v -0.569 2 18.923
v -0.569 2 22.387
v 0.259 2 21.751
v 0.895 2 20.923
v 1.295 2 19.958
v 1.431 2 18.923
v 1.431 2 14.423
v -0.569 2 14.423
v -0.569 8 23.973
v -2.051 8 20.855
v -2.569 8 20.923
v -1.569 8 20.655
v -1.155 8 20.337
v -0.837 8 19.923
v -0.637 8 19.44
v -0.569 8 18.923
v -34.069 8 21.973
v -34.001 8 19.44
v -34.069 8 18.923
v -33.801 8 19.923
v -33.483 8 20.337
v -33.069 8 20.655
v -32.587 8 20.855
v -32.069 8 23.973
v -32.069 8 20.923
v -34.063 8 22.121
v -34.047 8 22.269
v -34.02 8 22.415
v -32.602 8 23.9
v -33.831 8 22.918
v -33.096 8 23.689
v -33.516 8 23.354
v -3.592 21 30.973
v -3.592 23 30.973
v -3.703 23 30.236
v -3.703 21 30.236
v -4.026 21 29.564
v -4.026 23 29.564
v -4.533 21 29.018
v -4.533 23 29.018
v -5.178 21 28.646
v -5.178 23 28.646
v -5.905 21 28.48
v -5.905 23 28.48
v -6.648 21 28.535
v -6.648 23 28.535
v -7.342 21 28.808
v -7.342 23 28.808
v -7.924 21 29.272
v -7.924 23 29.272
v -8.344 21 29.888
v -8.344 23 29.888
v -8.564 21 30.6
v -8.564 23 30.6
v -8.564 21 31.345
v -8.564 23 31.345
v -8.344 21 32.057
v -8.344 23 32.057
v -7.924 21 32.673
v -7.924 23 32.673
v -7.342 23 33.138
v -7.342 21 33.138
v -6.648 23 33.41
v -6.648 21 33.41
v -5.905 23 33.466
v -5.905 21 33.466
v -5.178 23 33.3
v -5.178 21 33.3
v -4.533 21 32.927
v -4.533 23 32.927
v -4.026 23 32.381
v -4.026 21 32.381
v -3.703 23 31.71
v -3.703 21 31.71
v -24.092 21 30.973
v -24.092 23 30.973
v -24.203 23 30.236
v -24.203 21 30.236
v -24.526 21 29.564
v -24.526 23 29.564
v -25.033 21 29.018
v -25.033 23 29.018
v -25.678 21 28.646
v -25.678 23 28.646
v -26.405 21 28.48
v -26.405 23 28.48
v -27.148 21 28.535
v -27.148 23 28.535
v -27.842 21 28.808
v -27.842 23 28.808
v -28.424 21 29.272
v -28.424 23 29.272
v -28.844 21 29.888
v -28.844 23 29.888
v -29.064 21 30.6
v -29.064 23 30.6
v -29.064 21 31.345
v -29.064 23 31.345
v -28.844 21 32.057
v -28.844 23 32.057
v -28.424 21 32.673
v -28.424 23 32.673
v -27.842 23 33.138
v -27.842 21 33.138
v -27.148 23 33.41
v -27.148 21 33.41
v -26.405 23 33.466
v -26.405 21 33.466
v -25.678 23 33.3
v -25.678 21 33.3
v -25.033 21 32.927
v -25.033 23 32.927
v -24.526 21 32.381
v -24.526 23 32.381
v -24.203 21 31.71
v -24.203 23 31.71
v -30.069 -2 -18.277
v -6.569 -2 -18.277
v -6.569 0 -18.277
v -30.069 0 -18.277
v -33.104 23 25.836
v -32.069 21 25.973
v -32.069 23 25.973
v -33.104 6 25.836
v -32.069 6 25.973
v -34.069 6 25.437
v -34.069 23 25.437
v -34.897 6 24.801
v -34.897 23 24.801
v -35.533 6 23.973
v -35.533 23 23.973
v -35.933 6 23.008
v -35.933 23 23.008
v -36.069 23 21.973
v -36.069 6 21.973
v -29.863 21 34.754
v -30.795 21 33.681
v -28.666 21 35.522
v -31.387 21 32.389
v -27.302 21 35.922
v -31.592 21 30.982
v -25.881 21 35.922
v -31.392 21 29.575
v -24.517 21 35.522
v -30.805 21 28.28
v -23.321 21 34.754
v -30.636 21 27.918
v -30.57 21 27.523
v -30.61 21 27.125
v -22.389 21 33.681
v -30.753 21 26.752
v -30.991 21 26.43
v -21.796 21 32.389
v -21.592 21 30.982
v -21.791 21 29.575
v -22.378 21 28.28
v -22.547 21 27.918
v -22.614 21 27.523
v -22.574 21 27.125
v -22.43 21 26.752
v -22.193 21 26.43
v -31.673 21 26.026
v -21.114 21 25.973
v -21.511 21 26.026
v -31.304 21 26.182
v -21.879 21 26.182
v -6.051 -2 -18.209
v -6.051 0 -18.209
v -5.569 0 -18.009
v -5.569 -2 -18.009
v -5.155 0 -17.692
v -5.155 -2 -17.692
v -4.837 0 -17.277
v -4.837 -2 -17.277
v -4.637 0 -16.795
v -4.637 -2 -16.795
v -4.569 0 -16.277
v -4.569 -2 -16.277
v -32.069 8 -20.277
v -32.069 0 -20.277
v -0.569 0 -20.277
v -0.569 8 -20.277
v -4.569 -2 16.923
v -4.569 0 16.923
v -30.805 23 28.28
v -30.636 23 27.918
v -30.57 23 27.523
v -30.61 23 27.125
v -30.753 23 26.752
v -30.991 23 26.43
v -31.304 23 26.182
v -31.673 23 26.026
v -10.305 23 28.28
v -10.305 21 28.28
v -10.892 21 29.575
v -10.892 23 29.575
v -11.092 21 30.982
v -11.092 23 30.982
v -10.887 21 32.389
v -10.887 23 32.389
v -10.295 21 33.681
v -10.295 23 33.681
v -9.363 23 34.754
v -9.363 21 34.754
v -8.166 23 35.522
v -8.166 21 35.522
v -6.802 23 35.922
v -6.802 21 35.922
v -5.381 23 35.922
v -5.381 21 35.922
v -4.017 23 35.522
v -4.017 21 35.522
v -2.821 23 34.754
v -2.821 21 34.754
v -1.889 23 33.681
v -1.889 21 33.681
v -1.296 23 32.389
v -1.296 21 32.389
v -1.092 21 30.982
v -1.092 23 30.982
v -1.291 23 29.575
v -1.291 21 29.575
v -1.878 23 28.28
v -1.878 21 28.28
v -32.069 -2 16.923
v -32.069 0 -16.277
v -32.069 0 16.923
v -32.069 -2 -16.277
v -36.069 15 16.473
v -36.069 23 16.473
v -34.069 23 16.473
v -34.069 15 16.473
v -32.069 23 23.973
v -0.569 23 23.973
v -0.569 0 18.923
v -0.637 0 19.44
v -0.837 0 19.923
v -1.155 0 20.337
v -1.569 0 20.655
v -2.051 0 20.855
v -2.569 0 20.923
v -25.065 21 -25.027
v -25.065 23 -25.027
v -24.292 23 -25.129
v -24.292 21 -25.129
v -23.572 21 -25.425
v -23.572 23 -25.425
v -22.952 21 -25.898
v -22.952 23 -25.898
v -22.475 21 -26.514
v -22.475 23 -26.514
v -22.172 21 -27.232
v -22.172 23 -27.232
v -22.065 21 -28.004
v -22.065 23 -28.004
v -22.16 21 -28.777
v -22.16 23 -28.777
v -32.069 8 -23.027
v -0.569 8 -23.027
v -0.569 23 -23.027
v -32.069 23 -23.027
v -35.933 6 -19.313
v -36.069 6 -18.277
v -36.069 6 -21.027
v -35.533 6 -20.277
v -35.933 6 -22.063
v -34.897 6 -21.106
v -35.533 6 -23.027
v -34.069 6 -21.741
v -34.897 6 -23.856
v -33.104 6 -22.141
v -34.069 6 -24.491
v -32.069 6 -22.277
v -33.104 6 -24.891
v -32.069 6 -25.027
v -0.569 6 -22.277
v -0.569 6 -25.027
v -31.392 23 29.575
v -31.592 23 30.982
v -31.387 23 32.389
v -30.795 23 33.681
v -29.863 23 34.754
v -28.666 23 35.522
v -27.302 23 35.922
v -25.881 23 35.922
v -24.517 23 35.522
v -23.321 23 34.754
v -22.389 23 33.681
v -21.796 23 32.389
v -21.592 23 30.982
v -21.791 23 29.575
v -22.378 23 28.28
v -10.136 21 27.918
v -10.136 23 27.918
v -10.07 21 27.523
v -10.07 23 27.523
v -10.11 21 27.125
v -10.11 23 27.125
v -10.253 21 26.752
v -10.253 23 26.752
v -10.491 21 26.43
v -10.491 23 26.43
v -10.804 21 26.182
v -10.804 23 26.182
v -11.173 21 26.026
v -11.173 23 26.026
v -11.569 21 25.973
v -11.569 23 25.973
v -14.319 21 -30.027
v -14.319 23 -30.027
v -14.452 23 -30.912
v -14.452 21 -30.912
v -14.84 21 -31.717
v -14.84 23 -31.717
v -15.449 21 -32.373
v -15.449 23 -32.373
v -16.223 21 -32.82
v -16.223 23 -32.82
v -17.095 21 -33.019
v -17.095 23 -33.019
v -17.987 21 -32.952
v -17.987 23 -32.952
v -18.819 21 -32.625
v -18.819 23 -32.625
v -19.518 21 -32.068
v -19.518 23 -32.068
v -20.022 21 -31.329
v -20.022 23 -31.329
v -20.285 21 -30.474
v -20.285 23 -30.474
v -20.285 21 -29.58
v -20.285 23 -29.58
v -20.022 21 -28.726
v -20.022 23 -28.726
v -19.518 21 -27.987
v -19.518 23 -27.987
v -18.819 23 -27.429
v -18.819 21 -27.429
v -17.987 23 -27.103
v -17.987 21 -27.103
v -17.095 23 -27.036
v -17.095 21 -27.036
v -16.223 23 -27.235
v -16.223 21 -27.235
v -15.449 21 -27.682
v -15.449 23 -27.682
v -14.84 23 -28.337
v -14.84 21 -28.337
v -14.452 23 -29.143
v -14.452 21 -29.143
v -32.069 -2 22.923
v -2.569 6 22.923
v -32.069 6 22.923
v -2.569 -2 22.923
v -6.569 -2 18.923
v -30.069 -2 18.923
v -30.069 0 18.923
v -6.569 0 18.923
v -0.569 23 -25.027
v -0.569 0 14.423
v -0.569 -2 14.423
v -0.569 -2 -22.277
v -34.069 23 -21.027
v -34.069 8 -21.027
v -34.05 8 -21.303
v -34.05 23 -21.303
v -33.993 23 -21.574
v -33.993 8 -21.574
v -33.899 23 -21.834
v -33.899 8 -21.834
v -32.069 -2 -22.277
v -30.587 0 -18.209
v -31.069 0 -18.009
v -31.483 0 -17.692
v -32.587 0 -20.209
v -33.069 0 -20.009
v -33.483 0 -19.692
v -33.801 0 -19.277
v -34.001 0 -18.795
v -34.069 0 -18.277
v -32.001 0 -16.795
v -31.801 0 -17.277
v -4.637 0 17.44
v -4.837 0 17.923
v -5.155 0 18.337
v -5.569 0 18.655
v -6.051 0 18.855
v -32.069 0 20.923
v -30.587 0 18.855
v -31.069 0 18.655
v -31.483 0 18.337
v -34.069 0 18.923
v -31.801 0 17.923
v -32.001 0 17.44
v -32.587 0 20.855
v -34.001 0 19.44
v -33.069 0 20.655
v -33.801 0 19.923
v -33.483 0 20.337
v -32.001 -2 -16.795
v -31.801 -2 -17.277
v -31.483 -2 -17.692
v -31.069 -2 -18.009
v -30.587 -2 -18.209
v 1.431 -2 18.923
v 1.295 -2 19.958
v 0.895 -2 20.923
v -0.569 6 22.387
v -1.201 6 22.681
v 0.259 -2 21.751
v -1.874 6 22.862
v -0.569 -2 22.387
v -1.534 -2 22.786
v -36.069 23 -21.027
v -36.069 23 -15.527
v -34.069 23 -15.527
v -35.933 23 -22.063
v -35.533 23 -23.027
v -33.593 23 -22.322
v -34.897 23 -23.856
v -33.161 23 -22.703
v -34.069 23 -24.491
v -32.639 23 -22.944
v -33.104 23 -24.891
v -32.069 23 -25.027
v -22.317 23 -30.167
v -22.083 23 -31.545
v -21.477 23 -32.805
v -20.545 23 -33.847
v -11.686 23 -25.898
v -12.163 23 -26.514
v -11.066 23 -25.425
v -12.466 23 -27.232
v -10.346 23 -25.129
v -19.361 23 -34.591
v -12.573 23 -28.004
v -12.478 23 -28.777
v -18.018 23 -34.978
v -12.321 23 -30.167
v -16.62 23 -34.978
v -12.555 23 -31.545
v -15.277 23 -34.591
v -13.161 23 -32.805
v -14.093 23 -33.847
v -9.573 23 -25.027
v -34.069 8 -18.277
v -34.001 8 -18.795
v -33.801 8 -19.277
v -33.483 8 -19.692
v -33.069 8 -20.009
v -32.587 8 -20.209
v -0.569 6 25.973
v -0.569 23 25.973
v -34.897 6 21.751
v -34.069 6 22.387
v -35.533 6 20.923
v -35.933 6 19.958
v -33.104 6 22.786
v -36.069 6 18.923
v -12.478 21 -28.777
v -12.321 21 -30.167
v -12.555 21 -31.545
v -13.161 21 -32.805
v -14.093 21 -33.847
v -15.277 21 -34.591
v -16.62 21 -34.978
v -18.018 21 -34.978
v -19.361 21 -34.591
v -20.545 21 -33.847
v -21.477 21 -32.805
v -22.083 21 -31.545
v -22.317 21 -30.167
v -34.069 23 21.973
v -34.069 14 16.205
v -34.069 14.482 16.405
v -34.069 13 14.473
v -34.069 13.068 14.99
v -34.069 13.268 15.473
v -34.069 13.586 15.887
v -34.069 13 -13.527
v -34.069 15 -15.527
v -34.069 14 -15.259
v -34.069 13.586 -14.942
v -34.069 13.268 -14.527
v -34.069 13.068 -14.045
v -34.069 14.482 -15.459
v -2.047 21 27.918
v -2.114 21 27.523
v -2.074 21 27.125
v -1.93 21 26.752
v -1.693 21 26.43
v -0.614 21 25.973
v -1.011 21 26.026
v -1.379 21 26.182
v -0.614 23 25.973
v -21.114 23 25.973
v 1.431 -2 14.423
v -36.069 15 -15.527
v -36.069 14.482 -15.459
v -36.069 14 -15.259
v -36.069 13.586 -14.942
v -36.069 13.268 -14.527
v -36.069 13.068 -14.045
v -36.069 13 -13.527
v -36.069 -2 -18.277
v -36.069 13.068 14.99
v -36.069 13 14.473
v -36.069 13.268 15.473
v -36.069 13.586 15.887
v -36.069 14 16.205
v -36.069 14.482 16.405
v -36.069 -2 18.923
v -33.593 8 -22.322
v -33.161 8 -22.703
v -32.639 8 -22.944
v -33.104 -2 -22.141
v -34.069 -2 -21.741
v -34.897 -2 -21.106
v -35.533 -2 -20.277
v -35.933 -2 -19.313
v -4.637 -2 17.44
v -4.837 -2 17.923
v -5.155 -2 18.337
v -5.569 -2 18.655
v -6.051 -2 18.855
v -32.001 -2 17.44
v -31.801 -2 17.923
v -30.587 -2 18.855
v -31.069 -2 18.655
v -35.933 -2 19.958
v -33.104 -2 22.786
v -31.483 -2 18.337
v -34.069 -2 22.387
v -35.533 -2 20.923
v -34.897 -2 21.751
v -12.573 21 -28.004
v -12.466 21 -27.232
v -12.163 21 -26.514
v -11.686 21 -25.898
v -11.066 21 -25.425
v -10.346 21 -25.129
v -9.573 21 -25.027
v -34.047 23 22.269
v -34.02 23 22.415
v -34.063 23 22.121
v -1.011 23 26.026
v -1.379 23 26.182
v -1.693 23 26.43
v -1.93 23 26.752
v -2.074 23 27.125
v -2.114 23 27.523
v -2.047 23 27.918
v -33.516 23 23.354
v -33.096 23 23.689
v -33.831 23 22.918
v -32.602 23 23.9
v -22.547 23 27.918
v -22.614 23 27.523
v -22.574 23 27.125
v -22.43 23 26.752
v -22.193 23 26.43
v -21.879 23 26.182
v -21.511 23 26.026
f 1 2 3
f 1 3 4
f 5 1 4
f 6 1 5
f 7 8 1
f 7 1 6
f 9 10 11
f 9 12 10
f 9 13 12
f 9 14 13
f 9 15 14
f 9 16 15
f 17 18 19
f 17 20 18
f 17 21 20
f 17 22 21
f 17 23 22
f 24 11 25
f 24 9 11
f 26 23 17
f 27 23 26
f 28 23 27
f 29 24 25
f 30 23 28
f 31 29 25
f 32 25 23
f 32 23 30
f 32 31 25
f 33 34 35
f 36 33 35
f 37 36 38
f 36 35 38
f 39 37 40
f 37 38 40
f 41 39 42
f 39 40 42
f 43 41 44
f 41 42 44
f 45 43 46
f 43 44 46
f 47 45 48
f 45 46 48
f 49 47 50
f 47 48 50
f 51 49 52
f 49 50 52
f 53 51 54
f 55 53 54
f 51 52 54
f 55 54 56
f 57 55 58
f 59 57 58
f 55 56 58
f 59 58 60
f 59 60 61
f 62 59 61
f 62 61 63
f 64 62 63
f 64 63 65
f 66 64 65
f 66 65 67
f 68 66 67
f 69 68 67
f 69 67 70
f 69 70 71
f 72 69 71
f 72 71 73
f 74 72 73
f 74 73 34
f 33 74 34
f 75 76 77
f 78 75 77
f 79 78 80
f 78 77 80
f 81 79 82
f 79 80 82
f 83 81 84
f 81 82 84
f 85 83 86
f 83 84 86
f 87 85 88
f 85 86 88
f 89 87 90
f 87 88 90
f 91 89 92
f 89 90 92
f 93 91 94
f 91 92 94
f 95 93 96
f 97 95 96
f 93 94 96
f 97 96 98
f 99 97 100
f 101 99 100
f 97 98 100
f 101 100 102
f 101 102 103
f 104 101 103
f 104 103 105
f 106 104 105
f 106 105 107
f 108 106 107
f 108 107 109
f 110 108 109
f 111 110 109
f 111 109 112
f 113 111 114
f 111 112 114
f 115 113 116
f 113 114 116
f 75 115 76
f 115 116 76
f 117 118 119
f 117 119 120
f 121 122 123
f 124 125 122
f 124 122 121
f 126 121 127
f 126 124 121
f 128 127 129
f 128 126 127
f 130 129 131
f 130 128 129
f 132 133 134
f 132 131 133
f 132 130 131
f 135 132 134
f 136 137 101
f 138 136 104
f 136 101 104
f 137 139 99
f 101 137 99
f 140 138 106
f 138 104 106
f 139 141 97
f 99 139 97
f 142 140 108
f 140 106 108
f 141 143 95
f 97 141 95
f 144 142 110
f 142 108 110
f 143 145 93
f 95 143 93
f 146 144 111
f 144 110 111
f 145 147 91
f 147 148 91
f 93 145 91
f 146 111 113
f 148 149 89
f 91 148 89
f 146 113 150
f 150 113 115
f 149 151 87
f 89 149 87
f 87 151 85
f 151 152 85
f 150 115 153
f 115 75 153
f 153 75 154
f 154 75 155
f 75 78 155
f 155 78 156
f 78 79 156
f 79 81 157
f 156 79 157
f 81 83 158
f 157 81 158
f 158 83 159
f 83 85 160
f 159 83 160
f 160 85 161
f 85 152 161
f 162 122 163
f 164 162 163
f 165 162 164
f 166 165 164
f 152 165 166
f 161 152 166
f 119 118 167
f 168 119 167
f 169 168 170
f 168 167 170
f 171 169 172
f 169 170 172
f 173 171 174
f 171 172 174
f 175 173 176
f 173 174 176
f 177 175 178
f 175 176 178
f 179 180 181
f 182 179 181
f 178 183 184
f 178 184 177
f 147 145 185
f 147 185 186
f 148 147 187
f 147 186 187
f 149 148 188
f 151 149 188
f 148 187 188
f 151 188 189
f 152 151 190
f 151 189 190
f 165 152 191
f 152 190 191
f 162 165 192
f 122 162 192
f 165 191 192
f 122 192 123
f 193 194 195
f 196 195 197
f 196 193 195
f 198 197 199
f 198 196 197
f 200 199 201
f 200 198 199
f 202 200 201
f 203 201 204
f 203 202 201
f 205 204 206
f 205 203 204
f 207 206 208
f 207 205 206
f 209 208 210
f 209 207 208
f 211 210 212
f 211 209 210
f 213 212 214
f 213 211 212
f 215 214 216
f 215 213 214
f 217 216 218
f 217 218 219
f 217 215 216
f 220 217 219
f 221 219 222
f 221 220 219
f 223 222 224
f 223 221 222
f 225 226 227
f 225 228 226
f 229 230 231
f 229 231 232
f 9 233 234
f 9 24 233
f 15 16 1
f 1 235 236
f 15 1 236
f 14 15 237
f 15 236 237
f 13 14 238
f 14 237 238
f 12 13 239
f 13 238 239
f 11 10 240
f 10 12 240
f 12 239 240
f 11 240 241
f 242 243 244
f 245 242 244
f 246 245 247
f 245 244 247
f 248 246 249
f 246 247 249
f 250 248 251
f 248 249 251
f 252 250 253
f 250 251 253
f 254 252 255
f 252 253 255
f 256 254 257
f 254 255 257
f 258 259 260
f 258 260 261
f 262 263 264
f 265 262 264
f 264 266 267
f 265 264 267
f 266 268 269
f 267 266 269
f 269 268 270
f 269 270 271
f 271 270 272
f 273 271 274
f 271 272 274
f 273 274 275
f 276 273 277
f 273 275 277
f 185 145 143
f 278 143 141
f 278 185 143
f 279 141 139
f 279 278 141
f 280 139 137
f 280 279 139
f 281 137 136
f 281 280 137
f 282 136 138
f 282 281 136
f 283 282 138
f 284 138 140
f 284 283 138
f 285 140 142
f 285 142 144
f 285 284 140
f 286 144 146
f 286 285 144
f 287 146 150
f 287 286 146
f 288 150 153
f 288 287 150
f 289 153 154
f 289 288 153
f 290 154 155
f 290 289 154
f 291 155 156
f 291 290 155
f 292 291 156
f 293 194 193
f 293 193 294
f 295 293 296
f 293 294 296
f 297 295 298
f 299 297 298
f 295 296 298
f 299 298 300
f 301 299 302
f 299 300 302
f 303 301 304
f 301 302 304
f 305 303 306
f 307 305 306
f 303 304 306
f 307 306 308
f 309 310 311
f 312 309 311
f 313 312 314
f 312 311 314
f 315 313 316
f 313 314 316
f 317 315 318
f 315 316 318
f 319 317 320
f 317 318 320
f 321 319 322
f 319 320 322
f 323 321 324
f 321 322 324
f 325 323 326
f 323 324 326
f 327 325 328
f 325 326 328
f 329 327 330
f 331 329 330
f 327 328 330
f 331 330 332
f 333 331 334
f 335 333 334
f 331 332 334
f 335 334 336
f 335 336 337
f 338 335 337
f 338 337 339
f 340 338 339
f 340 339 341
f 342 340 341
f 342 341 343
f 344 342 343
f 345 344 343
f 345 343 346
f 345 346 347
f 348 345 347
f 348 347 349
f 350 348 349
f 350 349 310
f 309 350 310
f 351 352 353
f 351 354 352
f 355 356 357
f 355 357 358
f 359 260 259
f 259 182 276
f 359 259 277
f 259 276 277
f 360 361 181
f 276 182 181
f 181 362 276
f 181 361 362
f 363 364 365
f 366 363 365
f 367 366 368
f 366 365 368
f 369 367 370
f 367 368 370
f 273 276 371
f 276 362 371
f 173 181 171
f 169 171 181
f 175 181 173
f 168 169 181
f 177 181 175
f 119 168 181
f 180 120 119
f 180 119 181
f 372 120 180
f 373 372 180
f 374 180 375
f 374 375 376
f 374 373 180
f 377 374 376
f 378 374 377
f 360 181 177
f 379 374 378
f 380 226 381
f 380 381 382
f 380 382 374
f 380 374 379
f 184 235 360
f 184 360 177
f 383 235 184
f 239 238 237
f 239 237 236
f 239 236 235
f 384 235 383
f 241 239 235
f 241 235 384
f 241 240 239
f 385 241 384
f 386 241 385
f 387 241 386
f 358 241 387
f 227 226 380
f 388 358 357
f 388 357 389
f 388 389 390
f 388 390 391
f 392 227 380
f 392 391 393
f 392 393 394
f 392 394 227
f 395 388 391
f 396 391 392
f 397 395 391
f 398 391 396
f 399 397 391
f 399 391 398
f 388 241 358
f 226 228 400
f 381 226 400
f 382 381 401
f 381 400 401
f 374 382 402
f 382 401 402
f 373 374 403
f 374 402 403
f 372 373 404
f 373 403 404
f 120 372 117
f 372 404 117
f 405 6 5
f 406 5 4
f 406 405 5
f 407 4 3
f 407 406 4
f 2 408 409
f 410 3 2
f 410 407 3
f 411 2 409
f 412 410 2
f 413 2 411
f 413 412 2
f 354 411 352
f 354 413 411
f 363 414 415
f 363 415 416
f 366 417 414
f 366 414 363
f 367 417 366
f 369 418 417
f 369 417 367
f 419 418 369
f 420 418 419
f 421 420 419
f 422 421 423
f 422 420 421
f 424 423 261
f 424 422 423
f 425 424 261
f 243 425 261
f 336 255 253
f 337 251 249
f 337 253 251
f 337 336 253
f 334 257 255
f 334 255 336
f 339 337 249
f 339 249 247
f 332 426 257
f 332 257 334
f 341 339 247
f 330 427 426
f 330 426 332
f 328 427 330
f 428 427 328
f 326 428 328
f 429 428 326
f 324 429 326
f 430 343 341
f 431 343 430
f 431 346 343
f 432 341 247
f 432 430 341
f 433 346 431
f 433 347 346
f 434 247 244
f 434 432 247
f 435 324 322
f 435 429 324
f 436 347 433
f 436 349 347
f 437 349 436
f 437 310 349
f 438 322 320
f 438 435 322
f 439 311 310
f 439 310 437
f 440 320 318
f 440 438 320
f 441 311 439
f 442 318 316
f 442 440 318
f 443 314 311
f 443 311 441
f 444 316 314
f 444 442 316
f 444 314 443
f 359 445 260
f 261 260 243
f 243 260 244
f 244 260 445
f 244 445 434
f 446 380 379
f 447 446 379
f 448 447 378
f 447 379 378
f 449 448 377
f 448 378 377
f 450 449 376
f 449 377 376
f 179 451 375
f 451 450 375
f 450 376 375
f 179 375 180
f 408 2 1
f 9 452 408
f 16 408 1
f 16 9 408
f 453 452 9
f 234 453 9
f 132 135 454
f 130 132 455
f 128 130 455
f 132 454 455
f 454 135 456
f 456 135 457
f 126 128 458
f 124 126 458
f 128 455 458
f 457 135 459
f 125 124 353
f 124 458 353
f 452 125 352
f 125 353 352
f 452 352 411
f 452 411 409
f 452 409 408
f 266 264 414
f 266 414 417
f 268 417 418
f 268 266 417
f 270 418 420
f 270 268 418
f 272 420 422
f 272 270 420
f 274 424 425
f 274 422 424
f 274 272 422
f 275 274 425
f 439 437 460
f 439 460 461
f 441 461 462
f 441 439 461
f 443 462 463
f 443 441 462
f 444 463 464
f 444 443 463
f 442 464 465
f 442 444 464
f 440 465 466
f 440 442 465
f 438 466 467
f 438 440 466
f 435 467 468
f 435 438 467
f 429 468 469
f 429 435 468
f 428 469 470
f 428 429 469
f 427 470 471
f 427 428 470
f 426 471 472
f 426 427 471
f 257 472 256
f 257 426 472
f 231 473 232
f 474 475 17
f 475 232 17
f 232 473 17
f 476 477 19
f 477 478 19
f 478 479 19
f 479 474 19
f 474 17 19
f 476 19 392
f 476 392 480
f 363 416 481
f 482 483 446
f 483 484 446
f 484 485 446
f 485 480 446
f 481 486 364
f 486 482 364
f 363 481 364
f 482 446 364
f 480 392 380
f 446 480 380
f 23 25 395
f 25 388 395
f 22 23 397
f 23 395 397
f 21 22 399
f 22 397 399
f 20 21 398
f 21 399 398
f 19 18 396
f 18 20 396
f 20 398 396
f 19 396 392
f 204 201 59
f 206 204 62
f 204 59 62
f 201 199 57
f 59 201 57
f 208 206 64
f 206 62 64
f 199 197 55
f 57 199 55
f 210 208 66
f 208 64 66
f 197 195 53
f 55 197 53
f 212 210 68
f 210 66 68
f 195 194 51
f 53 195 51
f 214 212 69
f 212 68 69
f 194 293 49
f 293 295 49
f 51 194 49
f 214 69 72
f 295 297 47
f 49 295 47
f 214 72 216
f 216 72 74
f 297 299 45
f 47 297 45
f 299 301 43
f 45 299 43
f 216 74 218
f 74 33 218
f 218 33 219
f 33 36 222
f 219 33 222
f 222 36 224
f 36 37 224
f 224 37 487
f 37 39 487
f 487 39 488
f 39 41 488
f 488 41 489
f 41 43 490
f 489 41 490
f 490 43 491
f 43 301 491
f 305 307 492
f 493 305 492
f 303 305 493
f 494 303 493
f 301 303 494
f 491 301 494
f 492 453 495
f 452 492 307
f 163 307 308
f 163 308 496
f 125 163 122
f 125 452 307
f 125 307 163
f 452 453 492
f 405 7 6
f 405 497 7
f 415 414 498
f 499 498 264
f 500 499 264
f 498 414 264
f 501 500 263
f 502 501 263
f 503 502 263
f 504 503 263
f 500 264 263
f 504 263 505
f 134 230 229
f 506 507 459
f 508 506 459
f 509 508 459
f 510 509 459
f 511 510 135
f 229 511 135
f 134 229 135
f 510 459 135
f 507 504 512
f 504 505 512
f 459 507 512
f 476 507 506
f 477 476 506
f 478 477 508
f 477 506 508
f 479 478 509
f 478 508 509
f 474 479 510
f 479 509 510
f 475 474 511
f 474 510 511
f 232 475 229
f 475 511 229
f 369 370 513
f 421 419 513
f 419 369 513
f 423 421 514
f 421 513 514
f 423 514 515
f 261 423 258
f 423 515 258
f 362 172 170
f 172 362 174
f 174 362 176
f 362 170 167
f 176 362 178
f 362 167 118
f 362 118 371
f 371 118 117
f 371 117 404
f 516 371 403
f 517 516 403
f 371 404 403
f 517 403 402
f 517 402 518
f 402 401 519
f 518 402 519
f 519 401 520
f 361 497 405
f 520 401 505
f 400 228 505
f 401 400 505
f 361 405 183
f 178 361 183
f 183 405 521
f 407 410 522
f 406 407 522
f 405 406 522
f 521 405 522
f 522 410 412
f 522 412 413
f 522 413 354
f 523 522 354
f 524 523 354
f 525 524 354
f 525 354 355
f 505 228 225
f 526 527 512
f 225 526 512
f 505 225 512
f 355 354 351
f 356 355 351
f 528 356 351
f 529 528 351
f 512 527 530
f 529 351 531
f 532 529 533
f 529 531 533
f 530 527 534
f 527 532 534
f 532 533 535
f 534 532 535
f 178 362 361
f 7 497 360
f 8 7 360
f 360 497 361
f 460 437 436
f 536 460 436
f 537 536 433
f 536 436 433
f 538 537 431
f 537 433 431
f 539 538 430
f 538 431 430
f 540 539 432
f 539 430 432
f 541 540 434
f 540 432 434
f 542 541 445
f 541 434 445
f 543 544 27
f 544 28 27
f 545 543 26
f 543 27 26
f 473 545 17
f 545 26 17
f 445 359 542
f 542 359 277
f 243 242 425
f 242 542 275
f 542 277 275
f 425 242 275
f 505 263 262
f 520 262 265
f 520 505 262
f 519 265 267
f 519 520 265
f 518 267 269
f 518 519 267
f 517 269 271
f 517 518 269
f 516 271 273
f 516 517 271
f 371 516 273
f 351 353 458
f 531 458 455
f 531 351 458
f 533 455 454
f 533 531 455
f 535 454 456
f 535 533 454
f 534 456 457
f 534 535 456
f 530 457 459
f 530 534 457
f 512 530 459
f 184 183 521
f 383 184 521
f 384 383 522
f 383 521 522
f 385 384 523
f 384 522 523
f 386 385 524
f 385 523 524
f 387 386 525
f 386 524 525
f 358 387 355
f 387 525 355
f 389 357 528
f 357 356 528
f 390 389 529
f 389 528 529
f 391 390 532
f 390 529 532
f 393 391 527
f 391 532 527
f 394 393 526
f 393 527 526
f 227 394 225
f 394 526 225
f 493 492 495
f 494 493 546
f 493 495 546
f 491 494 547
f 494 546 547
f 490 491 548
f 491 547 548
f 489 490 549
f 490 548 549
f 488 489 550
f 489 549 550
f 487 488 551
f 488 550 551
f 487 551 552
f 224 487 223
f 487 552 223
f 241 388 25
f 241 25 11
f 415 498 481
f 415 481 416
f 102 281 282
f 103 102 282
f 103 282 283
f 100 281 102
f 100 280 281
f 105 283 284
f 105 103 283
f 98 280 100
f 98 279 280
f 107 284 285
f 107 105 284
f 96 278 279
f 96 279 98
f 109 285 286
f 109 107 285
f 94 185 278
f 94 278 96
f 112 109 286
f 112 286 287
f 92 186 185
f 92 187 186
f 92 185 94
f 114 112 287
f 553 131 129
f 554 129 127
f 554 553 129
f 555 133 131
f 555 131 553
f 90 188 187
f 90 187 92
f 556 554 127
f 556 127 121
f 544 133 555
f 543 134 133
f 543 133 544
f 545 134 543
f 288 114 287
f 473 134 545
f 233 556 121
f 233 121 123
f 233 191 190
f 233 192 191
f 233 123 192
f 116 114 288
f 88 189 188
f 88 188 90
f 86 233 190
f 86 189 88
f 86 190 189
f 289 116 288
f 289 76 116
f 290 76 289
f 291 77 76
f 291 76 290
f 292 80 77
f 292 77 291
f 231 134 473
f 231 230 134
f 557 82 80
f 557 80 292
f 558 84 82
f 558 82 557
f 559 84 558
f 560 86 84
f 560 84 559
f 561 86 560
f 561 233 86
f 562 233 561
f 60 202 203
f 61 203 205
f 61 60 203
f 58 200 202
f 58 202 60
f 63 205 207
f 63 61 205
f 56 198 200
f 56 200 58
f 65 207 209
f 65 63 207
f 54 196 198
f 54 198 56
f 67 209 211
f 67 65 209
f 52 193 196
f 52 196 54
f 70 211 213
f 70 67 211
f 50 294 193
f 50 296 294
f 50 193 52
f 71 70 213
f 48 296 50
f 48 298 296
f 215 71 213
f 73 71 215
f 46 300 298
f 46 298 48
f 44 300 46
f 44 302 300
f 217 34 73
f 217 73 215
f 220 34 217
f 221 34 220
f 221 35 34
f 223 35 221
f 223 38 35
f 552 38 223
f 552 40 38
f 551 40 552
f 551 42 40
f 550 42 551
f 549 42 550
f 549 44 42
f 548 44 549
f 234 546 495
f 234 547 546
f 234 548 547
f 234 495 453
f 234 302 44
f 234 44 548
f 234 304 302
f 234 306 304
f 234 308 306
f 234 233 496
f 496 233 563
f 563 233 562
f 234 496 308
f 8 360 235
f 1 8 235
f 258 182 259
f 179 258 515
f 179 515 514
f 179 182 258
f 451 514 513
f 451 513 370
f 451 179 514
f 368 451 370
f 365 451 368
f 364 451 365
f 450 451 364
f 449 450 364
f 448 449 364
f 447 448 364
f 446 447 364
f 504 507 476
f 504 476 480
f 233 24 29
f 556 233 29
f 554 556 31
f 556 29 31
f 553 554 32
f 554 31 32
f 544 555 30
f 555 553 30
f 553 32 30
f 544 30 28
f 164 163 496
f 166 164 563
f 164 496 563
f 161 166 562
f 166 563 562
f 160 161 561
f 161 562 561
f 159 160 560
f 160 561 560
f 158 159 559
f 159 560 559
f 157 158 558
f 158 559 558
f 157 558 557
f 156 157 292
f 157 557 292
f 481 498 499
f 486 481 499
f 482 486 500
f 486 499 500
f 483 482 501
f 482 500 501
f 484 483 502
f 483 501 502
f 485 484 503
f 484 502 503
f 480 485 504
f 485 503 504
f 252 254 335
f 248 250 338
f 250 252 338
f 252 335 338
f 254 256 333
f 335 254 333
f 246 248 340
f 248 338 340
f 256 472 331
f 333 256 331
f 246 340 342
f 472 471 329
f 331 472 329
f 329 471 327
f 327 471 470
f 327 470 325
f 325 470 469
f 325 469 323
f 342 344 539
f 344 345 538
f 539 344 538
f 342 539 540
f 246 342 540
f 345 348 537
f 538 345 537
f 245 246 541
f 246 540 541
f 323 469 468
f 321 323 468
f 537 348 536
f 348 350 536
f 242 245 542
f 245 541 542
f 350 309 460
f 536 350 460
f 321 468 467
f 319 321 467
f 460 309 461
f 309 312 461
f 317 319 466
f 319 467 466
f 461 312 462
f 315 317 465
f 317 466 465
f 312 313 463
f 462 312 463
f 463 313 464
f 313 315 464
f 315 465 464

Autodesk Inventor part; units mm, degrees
ref_plane "YZ Plane" through (0, 0, 0) normal (1, 0, 0) x (0, 1, 0)
ref_plane "XZ Plane" through (0, 0, 0) normal (0, 1, 0) x (-1, 0, 0)
sketch "Sketch1" plane through (0, 0, 0) normal (0, 1, 0) x (-1, 0, 0)
  arc A0 (31.569, 13.7227) -> (30.069, 12.2227) centre (31.569, 12.2227) ccw
  line L0 (31.569, 13.7227) -> (34.069, 13.7227)
  line L1 (34.069, 13.7227) -> (34.069, 18.9227)
  line L2 (32.069, 20.9227) -> (2.569, 20.9227)
  line L3 (34.069, -13.2773) -> (31.569, -13.2773)
  arc A1 (30.069, -11.7773) -> (31.569, -13.2773) centre (31.569, -11.7773) ccw
  arc A2 (34.069, 18.9227) -> (32.069, 20.9227) centre (32.069, 18.9227) ccw
  arc A3 (34.0195, 22.4149) -> (32.069, 23.9727) centre (32.069, 21.9727) ccw
  line L4 (32.069, 23.9727) -> (-23.931, 23.9727)
  arc A4 (-23.931, 23.9727) -> (-25.931, 21.9727) centre (-23.931, 21.9727) ccw
  line L5 (-25.931, 21.9727) -> (-25.931, -21.0273)
  arc A5 (-25.931, -21.0273) -> (-23.931, -23.0273) centre (-23.931, -21.0273) ccw
  line L6 (-23.931, -23.0273) -> (32.069, -23.0273)
  arc A6 (32.069, -23.0273) -> (33.899, -21.8341) centre (32.069, -21.0273) ccw
  arc A7 (32.069, -20.2773) -> (34.069, -18.2773) centre (32.069, -18.2773) ccw
  line L7 (32.069, -20.2773) -> (0.569, -20.2773)
  line L8 (34.069, -13.2773) -> (34.069, 13.7227)
  line L9 (0.569, -22.2773) -> (0.569, 18.9227)
  line L10 (30.069, -11.7773) -> (30.069, 12.2227)
  line L11 (34.069, -18.2773) -> (34.069, -13.2773)
  line L12 (2.569, 22.9227) -> (32.069, 22.9227)
  line L13 (0.569, -22.2773) -> (32.069, -22.2773)
  arc A8 (32.069, -22.2773) -> (36.069, -18.2773) centre (32.069, -18.2773) ccw
  line L14 (36.069, -18.2773) -> (36.069, 18.9227)
  arc A9 (2.569, 20.9227) -> (0.569, 18.9227) centre (2.569, 18.9227) ccw
  line L15 (-1.431, 14.4227) -> (-1.431, 18.9227)
  arc A10 (2.569, 22.9227) -> (-1.431, 18.9227) centre (2.569, 18.9227) ccw
  arc A11 (36.069, 18.9227) -> (32.069, 22.9227) centre (32.069, 18.9227) ccw
  line L16 (-1.431, 14.4227) -> (0.569, 14.4227)
  point P0 (0.569, 20.9227)
  dimension "d8" = 2
  dimension "d9" = 2
  dimension "d66" = 2
  dimension "d67" = 2
  dimension "d68" = 4.5
  dimension "d69" = 4
extrude "Extrusion3" add sketch "Sketch1" against normal blind 2 contours L0 L8 L3 A1 L10 A0 | A0 L10 A1 L3 L11 A7 L7 L9 A9 L2 A2 L1 L0 | L1 A2 L2 A9 L9 L16 L15 A10 L12 A11 L14 A8 L13 L7 A7 L11 L8
ref_plane "Work Plane1" through (0, 8, 0) normal (0, 1, 0) x (1, 0, 0)
extrude "Extrusion4" add sketch "Sketch1" along normal blind 8 contours L1 A2 L2 A9 L9 L16 L15 A10 L12 A11 L14 A8 L13 L7 A7 L11 L8
sketch "Sketch2" plane through (0, 8, 0) normal (0, 1, 0) x (1, 0, 0)
  line L0 (23.931, 23.0273) -> (-32.069, 23.0273) projected
  arc A0 (-32.069, 23.0273) -> (-33.899, 21.8341) centre (-32.069, 21.0273) ccw projected
  line L1 (-32.069, -23.9727) -> (23.931, -23.9727) projected
  arc A1 (-34.0195, -22.4149) -> (-32.069, -23.9727) centre (-32.069, -21.9727) ccw projected
  arc A2 (-32.069, 23.0273) -> (-34.069, 21.0273) centre (-32.069, 21.0273) ccw
  arc A3 (-34.069, -21.9727) -> (-32.069, -23.9727) centre (-32.069, -21.9727) ccw
  line L2 (-34.069, 18.2773) -> (-34.069, 13.2773) projected
  line L3 (-34.069, 13.2773) -> (-34.069, -13.7227) projected
  line L4 (-34.069, -13.7227) -> (-34.069, -18.9227) projected
  line L5 (-34.069, -21.9727) -> (-34.069, 21.0273)
  arc A4 (-32.069, 25.0273) -> (-36.069, 21.0273) centre (-32.069, 21.0273) ccw
  line L6 (-0.569, 25.0273) -> (-32.069, 25.0273)
  line L7 (-0.569, -25.9727) -> (-32.069, -25.9727)
  line L8 (-0.569, -23.9727) -> (-0.569, -25.9727)
  line L9 (-0.569, 20.2773) -> (-0.569, 25.0273)
  line L10 (-0.569, 22.2773) -> (-0.569, 22.2773) projected
  line L11 (-32.069, 23.0273) -> (-0.569, 23.0273)
  line L12 (-32.069, -23.9727) -> (-0.569, -23.9727)
  line L13 (-32.069, -20.9227) -> (-2.569, -20.9227) projected
  line L14 (-0.569, -14.4227) -> (-0.569, 20.2773) projected
  line L15 (-0.569, 20.2773) -> (-32.069, 20.2773) projected
  arc A5 (-32.069, 20.2773) -> (-34.069, 18.2773) centre (-32.069, 18.2773) ccw projected
  line L16 (-34.069, 18.2773) -> (-34.069, -18.9227) projected
  arc A6 (-34.069, -18.9227) -> (-32.069, -20.9227) centre (-32.069, -18.9227) ccw projected
  line L17 (-32.069, 22.2773) -> (-0.569, 22.2773) projected
  line L18 (-0.569, 22.2773) -> (-0.569, 22.2773)
  arc A7 (-2.569, -20.9227) -> (-0.569, -18.9227) centre (-2.569, -18.9227) ccw projected
  line L19 (-0.569, -18.9227) -> (-0.569, -14.4227) projected
  line L20 (-0.569, -23.9727) -> (-0.569, -18.9227)
  line L21 (-36.069, 21.0273) -> (-36.069, -21.9727)
  arc A8 (-36.069, -21.9727) -> (-32.069, -25.9727) centre (-32.069, -21.9727) ccw
  point P0 (0, 0)
  point P1 (-32.069, 25.0273)
  dimension "d19" = 2
  dimension "d20" = 2
  dimension "d21" = 31.5
  dimension "d22" = 31.5
  dimension "d23" = 31.5
extrude "Extrusion7" add sketch "Sketch2" against normal blind 2 contours L9 L15 A5 L5 A2 A0 L0 | L0 A0 A2 L5 L2 L3 L4 A3 A1 L1 L8 L7 A8 L21 A4 L6 L9 | L20 L1 A1 A3 L5 A6 L13 A7
extrude "Extrusion8" add sketch "Sketch2" along normal blind 15 contours L0 A0 A2 L5 L2 L3 L4 A3 A1 L1 L8 L7 A8 L21 A4 L6 L9
sketch "Sketch5" plane through (0, 23, 0) normal (0, 1, 0) x (1, 0, 0)
  circle A0 centre (-17.319, 30.0273) radius 5
  circle A1 centre (-17.319, 30.0273) radius 3
  arc A2 (-12.4777, 28.7773) -> (-9.573, 25.0273) centre (-9.573, 28.0273) ccw
  arc A3 (-25.0649, 25.0273) -> (-22.1602, 28.7773) centre (-25.0649, 28.0273) ccw
  line L0 (-0.569, 23.0273) -> (-0.569, 25.0273) projected
  circle A4 centre (-6.0917, -30.9727) radius 5
  circle A5 centre (-6.0917, -30.9727) radius 2.5
  arc A6 (-10.305, -28.2804) -> (-11.569, -25.9727) centre (-11.569, -27.4727) ccw
  arc A7 (-0.6145, -25.9727) -> (-1.8785, -28.2804) centre (-0.6145, -27.4727) ccw
  circle A8 centre (-26.5917, -30.9727) radius 5
  circle A9 centre (-26.5917, -30.9727) radius 2.5
  arc A10 (-30.805, -28.2804) -> (-32.069, -25.9727) centre (-32.069, -27.4727) ccw
  arc A11 (-21.1145, -25.9727) -> (-22.3785, -28.2804) centre (-21.1145, -27.4727) ccw
  line L1 (-0.569, -25.9727) -> (-0.569, -23.9727) projected
  line L2 (-0.569, 25.0273) -> (-32.069, 25.0273) projected
  line L3 (-32.069, -25.9727) -> (-0.569, -25.9727) projected
  point P0 (0, 0)
  point P1 (1.0185, -24.3852)
  point P2 (-26.5917, -25.9727)
  point P3 (-6.0917, -25.9727)
  point P4 (-17.319, 25.0273)
  dimension "d34" = 10
  dimension "d35" = 6
  dimension "d38" = 3
  dimension "d39" = 3
  dimension "d40" = 10
  dimension "d41" = 5
  dimension "d42" = 3
  dimension "d43" = 3
  dimension "d44" = 10
  dimension "d45" = 5
  dimension "d46" = 3
  dimension "d47" = 3
  dimension "d49" = 20.5
extrude "Extrusion10" add sketch "Sketch5" against normal blind 2
sketch "Sketch6" plane through (0, -2, 0) normal (0, -1, 0) x (1, 0, 0)
  line L0 (-0.569, -22.2773) -> (-0.569, 14.4227) projected
  line L1 (-2.569, 22.9227) -> (-32.069, 22.9227) projected
  arc A0 (-32.069, 22.9227) -> (-36.069, 18.9227) centre (-32.069, 18.9227) ccw projected
  line L2 (-36.069, 18.9227) -> (-36.069, -18.2773) projected
  arc A1 (-36.069, -18.2773) -> (-32.069, -22.2773) centre (-32.069, -18.2773) ccw projected
  line L3 (-32.069, -22.2773) -> (-0.569, -22.2773) projected
  line L4 (-30.069, 18.9227) -> (-6.569, 18.9227)
  line L5 (-4.569, 16.9227) -> (-4.569, -16.2773)
  line L6 (-6.569, -18.2773) -> (-30.069, -18.2773)
  line L7 (-32.069, -16.2773) -> (-32.069, 16.9227)
  arc A2 (-6.569, -18.2773) -> (-4.569, -16.2773) centre (-6.569, -16.2773) ccw
  arc A3 (-32.069, -16.2773) -> (-30.069, -18.2773) centre (-30.069, -16.2773) ccw
  arc A4 (-30.069, 18.9227) -> (-32.069, 16.9227) centre (-30.069, 16.9227) ccw
  arc A5 (-4.569, 16.9227) -> (-6.569, 18.9227) centre (-6.569, 16.9227) ccw
  line L8 (-0.569, 14.4227) -> (1.431, 14.4227) projected
  line L9 (1.431, 14.4227) -> (1.431, 18.9227) projected
  arc A6 (1.431, 18.9227) -> (-2.569, 22.9227) centre (-2.569, 18.9227) ccw projected
  point P0 (0, 0)
  point P1 (-4.569, 18.9227)
  point P2 (-4.569, -18.2773)
  dimension "d52" = 4
  dimension "d53" = 37.2
  dimension "d54" = 27.5
  dimension "d55" = 4
  dimension "d56" = 2
extrude "Extrusion11" cut sketch "Sketch6" against normal blind 2 contours L4 A5 L5 A2 L6 A3 L7 A4
sketch "Sketch7" plane through (-36.069, -2, -18.2773) normal (-1, 0, 0) x (0, 0, 1)
  line L0 (2.75, 25) -> (34.75, 25)
  line L1 (34.75, 25) -> (34.75, 17)
  line L2 (32.75, 15) -> (4.75, 15)
  line L3 (2.75, 17) -> (2.75, 25)
  arc A0 (2.75, 17) -> (4.75, 15) centre (4.75, 17) ccw
  arc A1 (32.75, 15) -> (34.75, 17) centre (32.75, 17) ccw
  point P0 (18.2773, 2)
  point P1 (40.25, 25)
  point P2 (-2.75, 25)
  point P3 (34.75, 21)
  point P4 (40.25, 8)
  dimension "d59" = 2
  dimension "d61" = 32
  dimension "d62" = 43
extrude "Extrusion12" cut sketch "Sketch7" against normal blind 6
sketch "Sketch8" plane through (0, 8, 0) normal (0, 1, 0) x (1, 0, 0)
  line L0 (-0.569, -14.4227) -> (-0.569, -18.9227) projected
  line L1 (1.431, -14.4227) -> (-0.569, -14.4227) projected
  line L2 (1.431, -18.9227) -> (1.431, -14.4227) projected
  arc A0 (-0.569, -22.3868) -> (1.431, -18.9227) centre (-2.569, -18.9227) ccw projected
  line L3 (-0.569, -23.9727) -> (-0.569, -18.9227) projected
  point P0 (0, 0)
extrude "Extrusion13" cut sketch "Sketch8" against normal blind 6
properties part number "CO-1-01-motorControllersMount"
